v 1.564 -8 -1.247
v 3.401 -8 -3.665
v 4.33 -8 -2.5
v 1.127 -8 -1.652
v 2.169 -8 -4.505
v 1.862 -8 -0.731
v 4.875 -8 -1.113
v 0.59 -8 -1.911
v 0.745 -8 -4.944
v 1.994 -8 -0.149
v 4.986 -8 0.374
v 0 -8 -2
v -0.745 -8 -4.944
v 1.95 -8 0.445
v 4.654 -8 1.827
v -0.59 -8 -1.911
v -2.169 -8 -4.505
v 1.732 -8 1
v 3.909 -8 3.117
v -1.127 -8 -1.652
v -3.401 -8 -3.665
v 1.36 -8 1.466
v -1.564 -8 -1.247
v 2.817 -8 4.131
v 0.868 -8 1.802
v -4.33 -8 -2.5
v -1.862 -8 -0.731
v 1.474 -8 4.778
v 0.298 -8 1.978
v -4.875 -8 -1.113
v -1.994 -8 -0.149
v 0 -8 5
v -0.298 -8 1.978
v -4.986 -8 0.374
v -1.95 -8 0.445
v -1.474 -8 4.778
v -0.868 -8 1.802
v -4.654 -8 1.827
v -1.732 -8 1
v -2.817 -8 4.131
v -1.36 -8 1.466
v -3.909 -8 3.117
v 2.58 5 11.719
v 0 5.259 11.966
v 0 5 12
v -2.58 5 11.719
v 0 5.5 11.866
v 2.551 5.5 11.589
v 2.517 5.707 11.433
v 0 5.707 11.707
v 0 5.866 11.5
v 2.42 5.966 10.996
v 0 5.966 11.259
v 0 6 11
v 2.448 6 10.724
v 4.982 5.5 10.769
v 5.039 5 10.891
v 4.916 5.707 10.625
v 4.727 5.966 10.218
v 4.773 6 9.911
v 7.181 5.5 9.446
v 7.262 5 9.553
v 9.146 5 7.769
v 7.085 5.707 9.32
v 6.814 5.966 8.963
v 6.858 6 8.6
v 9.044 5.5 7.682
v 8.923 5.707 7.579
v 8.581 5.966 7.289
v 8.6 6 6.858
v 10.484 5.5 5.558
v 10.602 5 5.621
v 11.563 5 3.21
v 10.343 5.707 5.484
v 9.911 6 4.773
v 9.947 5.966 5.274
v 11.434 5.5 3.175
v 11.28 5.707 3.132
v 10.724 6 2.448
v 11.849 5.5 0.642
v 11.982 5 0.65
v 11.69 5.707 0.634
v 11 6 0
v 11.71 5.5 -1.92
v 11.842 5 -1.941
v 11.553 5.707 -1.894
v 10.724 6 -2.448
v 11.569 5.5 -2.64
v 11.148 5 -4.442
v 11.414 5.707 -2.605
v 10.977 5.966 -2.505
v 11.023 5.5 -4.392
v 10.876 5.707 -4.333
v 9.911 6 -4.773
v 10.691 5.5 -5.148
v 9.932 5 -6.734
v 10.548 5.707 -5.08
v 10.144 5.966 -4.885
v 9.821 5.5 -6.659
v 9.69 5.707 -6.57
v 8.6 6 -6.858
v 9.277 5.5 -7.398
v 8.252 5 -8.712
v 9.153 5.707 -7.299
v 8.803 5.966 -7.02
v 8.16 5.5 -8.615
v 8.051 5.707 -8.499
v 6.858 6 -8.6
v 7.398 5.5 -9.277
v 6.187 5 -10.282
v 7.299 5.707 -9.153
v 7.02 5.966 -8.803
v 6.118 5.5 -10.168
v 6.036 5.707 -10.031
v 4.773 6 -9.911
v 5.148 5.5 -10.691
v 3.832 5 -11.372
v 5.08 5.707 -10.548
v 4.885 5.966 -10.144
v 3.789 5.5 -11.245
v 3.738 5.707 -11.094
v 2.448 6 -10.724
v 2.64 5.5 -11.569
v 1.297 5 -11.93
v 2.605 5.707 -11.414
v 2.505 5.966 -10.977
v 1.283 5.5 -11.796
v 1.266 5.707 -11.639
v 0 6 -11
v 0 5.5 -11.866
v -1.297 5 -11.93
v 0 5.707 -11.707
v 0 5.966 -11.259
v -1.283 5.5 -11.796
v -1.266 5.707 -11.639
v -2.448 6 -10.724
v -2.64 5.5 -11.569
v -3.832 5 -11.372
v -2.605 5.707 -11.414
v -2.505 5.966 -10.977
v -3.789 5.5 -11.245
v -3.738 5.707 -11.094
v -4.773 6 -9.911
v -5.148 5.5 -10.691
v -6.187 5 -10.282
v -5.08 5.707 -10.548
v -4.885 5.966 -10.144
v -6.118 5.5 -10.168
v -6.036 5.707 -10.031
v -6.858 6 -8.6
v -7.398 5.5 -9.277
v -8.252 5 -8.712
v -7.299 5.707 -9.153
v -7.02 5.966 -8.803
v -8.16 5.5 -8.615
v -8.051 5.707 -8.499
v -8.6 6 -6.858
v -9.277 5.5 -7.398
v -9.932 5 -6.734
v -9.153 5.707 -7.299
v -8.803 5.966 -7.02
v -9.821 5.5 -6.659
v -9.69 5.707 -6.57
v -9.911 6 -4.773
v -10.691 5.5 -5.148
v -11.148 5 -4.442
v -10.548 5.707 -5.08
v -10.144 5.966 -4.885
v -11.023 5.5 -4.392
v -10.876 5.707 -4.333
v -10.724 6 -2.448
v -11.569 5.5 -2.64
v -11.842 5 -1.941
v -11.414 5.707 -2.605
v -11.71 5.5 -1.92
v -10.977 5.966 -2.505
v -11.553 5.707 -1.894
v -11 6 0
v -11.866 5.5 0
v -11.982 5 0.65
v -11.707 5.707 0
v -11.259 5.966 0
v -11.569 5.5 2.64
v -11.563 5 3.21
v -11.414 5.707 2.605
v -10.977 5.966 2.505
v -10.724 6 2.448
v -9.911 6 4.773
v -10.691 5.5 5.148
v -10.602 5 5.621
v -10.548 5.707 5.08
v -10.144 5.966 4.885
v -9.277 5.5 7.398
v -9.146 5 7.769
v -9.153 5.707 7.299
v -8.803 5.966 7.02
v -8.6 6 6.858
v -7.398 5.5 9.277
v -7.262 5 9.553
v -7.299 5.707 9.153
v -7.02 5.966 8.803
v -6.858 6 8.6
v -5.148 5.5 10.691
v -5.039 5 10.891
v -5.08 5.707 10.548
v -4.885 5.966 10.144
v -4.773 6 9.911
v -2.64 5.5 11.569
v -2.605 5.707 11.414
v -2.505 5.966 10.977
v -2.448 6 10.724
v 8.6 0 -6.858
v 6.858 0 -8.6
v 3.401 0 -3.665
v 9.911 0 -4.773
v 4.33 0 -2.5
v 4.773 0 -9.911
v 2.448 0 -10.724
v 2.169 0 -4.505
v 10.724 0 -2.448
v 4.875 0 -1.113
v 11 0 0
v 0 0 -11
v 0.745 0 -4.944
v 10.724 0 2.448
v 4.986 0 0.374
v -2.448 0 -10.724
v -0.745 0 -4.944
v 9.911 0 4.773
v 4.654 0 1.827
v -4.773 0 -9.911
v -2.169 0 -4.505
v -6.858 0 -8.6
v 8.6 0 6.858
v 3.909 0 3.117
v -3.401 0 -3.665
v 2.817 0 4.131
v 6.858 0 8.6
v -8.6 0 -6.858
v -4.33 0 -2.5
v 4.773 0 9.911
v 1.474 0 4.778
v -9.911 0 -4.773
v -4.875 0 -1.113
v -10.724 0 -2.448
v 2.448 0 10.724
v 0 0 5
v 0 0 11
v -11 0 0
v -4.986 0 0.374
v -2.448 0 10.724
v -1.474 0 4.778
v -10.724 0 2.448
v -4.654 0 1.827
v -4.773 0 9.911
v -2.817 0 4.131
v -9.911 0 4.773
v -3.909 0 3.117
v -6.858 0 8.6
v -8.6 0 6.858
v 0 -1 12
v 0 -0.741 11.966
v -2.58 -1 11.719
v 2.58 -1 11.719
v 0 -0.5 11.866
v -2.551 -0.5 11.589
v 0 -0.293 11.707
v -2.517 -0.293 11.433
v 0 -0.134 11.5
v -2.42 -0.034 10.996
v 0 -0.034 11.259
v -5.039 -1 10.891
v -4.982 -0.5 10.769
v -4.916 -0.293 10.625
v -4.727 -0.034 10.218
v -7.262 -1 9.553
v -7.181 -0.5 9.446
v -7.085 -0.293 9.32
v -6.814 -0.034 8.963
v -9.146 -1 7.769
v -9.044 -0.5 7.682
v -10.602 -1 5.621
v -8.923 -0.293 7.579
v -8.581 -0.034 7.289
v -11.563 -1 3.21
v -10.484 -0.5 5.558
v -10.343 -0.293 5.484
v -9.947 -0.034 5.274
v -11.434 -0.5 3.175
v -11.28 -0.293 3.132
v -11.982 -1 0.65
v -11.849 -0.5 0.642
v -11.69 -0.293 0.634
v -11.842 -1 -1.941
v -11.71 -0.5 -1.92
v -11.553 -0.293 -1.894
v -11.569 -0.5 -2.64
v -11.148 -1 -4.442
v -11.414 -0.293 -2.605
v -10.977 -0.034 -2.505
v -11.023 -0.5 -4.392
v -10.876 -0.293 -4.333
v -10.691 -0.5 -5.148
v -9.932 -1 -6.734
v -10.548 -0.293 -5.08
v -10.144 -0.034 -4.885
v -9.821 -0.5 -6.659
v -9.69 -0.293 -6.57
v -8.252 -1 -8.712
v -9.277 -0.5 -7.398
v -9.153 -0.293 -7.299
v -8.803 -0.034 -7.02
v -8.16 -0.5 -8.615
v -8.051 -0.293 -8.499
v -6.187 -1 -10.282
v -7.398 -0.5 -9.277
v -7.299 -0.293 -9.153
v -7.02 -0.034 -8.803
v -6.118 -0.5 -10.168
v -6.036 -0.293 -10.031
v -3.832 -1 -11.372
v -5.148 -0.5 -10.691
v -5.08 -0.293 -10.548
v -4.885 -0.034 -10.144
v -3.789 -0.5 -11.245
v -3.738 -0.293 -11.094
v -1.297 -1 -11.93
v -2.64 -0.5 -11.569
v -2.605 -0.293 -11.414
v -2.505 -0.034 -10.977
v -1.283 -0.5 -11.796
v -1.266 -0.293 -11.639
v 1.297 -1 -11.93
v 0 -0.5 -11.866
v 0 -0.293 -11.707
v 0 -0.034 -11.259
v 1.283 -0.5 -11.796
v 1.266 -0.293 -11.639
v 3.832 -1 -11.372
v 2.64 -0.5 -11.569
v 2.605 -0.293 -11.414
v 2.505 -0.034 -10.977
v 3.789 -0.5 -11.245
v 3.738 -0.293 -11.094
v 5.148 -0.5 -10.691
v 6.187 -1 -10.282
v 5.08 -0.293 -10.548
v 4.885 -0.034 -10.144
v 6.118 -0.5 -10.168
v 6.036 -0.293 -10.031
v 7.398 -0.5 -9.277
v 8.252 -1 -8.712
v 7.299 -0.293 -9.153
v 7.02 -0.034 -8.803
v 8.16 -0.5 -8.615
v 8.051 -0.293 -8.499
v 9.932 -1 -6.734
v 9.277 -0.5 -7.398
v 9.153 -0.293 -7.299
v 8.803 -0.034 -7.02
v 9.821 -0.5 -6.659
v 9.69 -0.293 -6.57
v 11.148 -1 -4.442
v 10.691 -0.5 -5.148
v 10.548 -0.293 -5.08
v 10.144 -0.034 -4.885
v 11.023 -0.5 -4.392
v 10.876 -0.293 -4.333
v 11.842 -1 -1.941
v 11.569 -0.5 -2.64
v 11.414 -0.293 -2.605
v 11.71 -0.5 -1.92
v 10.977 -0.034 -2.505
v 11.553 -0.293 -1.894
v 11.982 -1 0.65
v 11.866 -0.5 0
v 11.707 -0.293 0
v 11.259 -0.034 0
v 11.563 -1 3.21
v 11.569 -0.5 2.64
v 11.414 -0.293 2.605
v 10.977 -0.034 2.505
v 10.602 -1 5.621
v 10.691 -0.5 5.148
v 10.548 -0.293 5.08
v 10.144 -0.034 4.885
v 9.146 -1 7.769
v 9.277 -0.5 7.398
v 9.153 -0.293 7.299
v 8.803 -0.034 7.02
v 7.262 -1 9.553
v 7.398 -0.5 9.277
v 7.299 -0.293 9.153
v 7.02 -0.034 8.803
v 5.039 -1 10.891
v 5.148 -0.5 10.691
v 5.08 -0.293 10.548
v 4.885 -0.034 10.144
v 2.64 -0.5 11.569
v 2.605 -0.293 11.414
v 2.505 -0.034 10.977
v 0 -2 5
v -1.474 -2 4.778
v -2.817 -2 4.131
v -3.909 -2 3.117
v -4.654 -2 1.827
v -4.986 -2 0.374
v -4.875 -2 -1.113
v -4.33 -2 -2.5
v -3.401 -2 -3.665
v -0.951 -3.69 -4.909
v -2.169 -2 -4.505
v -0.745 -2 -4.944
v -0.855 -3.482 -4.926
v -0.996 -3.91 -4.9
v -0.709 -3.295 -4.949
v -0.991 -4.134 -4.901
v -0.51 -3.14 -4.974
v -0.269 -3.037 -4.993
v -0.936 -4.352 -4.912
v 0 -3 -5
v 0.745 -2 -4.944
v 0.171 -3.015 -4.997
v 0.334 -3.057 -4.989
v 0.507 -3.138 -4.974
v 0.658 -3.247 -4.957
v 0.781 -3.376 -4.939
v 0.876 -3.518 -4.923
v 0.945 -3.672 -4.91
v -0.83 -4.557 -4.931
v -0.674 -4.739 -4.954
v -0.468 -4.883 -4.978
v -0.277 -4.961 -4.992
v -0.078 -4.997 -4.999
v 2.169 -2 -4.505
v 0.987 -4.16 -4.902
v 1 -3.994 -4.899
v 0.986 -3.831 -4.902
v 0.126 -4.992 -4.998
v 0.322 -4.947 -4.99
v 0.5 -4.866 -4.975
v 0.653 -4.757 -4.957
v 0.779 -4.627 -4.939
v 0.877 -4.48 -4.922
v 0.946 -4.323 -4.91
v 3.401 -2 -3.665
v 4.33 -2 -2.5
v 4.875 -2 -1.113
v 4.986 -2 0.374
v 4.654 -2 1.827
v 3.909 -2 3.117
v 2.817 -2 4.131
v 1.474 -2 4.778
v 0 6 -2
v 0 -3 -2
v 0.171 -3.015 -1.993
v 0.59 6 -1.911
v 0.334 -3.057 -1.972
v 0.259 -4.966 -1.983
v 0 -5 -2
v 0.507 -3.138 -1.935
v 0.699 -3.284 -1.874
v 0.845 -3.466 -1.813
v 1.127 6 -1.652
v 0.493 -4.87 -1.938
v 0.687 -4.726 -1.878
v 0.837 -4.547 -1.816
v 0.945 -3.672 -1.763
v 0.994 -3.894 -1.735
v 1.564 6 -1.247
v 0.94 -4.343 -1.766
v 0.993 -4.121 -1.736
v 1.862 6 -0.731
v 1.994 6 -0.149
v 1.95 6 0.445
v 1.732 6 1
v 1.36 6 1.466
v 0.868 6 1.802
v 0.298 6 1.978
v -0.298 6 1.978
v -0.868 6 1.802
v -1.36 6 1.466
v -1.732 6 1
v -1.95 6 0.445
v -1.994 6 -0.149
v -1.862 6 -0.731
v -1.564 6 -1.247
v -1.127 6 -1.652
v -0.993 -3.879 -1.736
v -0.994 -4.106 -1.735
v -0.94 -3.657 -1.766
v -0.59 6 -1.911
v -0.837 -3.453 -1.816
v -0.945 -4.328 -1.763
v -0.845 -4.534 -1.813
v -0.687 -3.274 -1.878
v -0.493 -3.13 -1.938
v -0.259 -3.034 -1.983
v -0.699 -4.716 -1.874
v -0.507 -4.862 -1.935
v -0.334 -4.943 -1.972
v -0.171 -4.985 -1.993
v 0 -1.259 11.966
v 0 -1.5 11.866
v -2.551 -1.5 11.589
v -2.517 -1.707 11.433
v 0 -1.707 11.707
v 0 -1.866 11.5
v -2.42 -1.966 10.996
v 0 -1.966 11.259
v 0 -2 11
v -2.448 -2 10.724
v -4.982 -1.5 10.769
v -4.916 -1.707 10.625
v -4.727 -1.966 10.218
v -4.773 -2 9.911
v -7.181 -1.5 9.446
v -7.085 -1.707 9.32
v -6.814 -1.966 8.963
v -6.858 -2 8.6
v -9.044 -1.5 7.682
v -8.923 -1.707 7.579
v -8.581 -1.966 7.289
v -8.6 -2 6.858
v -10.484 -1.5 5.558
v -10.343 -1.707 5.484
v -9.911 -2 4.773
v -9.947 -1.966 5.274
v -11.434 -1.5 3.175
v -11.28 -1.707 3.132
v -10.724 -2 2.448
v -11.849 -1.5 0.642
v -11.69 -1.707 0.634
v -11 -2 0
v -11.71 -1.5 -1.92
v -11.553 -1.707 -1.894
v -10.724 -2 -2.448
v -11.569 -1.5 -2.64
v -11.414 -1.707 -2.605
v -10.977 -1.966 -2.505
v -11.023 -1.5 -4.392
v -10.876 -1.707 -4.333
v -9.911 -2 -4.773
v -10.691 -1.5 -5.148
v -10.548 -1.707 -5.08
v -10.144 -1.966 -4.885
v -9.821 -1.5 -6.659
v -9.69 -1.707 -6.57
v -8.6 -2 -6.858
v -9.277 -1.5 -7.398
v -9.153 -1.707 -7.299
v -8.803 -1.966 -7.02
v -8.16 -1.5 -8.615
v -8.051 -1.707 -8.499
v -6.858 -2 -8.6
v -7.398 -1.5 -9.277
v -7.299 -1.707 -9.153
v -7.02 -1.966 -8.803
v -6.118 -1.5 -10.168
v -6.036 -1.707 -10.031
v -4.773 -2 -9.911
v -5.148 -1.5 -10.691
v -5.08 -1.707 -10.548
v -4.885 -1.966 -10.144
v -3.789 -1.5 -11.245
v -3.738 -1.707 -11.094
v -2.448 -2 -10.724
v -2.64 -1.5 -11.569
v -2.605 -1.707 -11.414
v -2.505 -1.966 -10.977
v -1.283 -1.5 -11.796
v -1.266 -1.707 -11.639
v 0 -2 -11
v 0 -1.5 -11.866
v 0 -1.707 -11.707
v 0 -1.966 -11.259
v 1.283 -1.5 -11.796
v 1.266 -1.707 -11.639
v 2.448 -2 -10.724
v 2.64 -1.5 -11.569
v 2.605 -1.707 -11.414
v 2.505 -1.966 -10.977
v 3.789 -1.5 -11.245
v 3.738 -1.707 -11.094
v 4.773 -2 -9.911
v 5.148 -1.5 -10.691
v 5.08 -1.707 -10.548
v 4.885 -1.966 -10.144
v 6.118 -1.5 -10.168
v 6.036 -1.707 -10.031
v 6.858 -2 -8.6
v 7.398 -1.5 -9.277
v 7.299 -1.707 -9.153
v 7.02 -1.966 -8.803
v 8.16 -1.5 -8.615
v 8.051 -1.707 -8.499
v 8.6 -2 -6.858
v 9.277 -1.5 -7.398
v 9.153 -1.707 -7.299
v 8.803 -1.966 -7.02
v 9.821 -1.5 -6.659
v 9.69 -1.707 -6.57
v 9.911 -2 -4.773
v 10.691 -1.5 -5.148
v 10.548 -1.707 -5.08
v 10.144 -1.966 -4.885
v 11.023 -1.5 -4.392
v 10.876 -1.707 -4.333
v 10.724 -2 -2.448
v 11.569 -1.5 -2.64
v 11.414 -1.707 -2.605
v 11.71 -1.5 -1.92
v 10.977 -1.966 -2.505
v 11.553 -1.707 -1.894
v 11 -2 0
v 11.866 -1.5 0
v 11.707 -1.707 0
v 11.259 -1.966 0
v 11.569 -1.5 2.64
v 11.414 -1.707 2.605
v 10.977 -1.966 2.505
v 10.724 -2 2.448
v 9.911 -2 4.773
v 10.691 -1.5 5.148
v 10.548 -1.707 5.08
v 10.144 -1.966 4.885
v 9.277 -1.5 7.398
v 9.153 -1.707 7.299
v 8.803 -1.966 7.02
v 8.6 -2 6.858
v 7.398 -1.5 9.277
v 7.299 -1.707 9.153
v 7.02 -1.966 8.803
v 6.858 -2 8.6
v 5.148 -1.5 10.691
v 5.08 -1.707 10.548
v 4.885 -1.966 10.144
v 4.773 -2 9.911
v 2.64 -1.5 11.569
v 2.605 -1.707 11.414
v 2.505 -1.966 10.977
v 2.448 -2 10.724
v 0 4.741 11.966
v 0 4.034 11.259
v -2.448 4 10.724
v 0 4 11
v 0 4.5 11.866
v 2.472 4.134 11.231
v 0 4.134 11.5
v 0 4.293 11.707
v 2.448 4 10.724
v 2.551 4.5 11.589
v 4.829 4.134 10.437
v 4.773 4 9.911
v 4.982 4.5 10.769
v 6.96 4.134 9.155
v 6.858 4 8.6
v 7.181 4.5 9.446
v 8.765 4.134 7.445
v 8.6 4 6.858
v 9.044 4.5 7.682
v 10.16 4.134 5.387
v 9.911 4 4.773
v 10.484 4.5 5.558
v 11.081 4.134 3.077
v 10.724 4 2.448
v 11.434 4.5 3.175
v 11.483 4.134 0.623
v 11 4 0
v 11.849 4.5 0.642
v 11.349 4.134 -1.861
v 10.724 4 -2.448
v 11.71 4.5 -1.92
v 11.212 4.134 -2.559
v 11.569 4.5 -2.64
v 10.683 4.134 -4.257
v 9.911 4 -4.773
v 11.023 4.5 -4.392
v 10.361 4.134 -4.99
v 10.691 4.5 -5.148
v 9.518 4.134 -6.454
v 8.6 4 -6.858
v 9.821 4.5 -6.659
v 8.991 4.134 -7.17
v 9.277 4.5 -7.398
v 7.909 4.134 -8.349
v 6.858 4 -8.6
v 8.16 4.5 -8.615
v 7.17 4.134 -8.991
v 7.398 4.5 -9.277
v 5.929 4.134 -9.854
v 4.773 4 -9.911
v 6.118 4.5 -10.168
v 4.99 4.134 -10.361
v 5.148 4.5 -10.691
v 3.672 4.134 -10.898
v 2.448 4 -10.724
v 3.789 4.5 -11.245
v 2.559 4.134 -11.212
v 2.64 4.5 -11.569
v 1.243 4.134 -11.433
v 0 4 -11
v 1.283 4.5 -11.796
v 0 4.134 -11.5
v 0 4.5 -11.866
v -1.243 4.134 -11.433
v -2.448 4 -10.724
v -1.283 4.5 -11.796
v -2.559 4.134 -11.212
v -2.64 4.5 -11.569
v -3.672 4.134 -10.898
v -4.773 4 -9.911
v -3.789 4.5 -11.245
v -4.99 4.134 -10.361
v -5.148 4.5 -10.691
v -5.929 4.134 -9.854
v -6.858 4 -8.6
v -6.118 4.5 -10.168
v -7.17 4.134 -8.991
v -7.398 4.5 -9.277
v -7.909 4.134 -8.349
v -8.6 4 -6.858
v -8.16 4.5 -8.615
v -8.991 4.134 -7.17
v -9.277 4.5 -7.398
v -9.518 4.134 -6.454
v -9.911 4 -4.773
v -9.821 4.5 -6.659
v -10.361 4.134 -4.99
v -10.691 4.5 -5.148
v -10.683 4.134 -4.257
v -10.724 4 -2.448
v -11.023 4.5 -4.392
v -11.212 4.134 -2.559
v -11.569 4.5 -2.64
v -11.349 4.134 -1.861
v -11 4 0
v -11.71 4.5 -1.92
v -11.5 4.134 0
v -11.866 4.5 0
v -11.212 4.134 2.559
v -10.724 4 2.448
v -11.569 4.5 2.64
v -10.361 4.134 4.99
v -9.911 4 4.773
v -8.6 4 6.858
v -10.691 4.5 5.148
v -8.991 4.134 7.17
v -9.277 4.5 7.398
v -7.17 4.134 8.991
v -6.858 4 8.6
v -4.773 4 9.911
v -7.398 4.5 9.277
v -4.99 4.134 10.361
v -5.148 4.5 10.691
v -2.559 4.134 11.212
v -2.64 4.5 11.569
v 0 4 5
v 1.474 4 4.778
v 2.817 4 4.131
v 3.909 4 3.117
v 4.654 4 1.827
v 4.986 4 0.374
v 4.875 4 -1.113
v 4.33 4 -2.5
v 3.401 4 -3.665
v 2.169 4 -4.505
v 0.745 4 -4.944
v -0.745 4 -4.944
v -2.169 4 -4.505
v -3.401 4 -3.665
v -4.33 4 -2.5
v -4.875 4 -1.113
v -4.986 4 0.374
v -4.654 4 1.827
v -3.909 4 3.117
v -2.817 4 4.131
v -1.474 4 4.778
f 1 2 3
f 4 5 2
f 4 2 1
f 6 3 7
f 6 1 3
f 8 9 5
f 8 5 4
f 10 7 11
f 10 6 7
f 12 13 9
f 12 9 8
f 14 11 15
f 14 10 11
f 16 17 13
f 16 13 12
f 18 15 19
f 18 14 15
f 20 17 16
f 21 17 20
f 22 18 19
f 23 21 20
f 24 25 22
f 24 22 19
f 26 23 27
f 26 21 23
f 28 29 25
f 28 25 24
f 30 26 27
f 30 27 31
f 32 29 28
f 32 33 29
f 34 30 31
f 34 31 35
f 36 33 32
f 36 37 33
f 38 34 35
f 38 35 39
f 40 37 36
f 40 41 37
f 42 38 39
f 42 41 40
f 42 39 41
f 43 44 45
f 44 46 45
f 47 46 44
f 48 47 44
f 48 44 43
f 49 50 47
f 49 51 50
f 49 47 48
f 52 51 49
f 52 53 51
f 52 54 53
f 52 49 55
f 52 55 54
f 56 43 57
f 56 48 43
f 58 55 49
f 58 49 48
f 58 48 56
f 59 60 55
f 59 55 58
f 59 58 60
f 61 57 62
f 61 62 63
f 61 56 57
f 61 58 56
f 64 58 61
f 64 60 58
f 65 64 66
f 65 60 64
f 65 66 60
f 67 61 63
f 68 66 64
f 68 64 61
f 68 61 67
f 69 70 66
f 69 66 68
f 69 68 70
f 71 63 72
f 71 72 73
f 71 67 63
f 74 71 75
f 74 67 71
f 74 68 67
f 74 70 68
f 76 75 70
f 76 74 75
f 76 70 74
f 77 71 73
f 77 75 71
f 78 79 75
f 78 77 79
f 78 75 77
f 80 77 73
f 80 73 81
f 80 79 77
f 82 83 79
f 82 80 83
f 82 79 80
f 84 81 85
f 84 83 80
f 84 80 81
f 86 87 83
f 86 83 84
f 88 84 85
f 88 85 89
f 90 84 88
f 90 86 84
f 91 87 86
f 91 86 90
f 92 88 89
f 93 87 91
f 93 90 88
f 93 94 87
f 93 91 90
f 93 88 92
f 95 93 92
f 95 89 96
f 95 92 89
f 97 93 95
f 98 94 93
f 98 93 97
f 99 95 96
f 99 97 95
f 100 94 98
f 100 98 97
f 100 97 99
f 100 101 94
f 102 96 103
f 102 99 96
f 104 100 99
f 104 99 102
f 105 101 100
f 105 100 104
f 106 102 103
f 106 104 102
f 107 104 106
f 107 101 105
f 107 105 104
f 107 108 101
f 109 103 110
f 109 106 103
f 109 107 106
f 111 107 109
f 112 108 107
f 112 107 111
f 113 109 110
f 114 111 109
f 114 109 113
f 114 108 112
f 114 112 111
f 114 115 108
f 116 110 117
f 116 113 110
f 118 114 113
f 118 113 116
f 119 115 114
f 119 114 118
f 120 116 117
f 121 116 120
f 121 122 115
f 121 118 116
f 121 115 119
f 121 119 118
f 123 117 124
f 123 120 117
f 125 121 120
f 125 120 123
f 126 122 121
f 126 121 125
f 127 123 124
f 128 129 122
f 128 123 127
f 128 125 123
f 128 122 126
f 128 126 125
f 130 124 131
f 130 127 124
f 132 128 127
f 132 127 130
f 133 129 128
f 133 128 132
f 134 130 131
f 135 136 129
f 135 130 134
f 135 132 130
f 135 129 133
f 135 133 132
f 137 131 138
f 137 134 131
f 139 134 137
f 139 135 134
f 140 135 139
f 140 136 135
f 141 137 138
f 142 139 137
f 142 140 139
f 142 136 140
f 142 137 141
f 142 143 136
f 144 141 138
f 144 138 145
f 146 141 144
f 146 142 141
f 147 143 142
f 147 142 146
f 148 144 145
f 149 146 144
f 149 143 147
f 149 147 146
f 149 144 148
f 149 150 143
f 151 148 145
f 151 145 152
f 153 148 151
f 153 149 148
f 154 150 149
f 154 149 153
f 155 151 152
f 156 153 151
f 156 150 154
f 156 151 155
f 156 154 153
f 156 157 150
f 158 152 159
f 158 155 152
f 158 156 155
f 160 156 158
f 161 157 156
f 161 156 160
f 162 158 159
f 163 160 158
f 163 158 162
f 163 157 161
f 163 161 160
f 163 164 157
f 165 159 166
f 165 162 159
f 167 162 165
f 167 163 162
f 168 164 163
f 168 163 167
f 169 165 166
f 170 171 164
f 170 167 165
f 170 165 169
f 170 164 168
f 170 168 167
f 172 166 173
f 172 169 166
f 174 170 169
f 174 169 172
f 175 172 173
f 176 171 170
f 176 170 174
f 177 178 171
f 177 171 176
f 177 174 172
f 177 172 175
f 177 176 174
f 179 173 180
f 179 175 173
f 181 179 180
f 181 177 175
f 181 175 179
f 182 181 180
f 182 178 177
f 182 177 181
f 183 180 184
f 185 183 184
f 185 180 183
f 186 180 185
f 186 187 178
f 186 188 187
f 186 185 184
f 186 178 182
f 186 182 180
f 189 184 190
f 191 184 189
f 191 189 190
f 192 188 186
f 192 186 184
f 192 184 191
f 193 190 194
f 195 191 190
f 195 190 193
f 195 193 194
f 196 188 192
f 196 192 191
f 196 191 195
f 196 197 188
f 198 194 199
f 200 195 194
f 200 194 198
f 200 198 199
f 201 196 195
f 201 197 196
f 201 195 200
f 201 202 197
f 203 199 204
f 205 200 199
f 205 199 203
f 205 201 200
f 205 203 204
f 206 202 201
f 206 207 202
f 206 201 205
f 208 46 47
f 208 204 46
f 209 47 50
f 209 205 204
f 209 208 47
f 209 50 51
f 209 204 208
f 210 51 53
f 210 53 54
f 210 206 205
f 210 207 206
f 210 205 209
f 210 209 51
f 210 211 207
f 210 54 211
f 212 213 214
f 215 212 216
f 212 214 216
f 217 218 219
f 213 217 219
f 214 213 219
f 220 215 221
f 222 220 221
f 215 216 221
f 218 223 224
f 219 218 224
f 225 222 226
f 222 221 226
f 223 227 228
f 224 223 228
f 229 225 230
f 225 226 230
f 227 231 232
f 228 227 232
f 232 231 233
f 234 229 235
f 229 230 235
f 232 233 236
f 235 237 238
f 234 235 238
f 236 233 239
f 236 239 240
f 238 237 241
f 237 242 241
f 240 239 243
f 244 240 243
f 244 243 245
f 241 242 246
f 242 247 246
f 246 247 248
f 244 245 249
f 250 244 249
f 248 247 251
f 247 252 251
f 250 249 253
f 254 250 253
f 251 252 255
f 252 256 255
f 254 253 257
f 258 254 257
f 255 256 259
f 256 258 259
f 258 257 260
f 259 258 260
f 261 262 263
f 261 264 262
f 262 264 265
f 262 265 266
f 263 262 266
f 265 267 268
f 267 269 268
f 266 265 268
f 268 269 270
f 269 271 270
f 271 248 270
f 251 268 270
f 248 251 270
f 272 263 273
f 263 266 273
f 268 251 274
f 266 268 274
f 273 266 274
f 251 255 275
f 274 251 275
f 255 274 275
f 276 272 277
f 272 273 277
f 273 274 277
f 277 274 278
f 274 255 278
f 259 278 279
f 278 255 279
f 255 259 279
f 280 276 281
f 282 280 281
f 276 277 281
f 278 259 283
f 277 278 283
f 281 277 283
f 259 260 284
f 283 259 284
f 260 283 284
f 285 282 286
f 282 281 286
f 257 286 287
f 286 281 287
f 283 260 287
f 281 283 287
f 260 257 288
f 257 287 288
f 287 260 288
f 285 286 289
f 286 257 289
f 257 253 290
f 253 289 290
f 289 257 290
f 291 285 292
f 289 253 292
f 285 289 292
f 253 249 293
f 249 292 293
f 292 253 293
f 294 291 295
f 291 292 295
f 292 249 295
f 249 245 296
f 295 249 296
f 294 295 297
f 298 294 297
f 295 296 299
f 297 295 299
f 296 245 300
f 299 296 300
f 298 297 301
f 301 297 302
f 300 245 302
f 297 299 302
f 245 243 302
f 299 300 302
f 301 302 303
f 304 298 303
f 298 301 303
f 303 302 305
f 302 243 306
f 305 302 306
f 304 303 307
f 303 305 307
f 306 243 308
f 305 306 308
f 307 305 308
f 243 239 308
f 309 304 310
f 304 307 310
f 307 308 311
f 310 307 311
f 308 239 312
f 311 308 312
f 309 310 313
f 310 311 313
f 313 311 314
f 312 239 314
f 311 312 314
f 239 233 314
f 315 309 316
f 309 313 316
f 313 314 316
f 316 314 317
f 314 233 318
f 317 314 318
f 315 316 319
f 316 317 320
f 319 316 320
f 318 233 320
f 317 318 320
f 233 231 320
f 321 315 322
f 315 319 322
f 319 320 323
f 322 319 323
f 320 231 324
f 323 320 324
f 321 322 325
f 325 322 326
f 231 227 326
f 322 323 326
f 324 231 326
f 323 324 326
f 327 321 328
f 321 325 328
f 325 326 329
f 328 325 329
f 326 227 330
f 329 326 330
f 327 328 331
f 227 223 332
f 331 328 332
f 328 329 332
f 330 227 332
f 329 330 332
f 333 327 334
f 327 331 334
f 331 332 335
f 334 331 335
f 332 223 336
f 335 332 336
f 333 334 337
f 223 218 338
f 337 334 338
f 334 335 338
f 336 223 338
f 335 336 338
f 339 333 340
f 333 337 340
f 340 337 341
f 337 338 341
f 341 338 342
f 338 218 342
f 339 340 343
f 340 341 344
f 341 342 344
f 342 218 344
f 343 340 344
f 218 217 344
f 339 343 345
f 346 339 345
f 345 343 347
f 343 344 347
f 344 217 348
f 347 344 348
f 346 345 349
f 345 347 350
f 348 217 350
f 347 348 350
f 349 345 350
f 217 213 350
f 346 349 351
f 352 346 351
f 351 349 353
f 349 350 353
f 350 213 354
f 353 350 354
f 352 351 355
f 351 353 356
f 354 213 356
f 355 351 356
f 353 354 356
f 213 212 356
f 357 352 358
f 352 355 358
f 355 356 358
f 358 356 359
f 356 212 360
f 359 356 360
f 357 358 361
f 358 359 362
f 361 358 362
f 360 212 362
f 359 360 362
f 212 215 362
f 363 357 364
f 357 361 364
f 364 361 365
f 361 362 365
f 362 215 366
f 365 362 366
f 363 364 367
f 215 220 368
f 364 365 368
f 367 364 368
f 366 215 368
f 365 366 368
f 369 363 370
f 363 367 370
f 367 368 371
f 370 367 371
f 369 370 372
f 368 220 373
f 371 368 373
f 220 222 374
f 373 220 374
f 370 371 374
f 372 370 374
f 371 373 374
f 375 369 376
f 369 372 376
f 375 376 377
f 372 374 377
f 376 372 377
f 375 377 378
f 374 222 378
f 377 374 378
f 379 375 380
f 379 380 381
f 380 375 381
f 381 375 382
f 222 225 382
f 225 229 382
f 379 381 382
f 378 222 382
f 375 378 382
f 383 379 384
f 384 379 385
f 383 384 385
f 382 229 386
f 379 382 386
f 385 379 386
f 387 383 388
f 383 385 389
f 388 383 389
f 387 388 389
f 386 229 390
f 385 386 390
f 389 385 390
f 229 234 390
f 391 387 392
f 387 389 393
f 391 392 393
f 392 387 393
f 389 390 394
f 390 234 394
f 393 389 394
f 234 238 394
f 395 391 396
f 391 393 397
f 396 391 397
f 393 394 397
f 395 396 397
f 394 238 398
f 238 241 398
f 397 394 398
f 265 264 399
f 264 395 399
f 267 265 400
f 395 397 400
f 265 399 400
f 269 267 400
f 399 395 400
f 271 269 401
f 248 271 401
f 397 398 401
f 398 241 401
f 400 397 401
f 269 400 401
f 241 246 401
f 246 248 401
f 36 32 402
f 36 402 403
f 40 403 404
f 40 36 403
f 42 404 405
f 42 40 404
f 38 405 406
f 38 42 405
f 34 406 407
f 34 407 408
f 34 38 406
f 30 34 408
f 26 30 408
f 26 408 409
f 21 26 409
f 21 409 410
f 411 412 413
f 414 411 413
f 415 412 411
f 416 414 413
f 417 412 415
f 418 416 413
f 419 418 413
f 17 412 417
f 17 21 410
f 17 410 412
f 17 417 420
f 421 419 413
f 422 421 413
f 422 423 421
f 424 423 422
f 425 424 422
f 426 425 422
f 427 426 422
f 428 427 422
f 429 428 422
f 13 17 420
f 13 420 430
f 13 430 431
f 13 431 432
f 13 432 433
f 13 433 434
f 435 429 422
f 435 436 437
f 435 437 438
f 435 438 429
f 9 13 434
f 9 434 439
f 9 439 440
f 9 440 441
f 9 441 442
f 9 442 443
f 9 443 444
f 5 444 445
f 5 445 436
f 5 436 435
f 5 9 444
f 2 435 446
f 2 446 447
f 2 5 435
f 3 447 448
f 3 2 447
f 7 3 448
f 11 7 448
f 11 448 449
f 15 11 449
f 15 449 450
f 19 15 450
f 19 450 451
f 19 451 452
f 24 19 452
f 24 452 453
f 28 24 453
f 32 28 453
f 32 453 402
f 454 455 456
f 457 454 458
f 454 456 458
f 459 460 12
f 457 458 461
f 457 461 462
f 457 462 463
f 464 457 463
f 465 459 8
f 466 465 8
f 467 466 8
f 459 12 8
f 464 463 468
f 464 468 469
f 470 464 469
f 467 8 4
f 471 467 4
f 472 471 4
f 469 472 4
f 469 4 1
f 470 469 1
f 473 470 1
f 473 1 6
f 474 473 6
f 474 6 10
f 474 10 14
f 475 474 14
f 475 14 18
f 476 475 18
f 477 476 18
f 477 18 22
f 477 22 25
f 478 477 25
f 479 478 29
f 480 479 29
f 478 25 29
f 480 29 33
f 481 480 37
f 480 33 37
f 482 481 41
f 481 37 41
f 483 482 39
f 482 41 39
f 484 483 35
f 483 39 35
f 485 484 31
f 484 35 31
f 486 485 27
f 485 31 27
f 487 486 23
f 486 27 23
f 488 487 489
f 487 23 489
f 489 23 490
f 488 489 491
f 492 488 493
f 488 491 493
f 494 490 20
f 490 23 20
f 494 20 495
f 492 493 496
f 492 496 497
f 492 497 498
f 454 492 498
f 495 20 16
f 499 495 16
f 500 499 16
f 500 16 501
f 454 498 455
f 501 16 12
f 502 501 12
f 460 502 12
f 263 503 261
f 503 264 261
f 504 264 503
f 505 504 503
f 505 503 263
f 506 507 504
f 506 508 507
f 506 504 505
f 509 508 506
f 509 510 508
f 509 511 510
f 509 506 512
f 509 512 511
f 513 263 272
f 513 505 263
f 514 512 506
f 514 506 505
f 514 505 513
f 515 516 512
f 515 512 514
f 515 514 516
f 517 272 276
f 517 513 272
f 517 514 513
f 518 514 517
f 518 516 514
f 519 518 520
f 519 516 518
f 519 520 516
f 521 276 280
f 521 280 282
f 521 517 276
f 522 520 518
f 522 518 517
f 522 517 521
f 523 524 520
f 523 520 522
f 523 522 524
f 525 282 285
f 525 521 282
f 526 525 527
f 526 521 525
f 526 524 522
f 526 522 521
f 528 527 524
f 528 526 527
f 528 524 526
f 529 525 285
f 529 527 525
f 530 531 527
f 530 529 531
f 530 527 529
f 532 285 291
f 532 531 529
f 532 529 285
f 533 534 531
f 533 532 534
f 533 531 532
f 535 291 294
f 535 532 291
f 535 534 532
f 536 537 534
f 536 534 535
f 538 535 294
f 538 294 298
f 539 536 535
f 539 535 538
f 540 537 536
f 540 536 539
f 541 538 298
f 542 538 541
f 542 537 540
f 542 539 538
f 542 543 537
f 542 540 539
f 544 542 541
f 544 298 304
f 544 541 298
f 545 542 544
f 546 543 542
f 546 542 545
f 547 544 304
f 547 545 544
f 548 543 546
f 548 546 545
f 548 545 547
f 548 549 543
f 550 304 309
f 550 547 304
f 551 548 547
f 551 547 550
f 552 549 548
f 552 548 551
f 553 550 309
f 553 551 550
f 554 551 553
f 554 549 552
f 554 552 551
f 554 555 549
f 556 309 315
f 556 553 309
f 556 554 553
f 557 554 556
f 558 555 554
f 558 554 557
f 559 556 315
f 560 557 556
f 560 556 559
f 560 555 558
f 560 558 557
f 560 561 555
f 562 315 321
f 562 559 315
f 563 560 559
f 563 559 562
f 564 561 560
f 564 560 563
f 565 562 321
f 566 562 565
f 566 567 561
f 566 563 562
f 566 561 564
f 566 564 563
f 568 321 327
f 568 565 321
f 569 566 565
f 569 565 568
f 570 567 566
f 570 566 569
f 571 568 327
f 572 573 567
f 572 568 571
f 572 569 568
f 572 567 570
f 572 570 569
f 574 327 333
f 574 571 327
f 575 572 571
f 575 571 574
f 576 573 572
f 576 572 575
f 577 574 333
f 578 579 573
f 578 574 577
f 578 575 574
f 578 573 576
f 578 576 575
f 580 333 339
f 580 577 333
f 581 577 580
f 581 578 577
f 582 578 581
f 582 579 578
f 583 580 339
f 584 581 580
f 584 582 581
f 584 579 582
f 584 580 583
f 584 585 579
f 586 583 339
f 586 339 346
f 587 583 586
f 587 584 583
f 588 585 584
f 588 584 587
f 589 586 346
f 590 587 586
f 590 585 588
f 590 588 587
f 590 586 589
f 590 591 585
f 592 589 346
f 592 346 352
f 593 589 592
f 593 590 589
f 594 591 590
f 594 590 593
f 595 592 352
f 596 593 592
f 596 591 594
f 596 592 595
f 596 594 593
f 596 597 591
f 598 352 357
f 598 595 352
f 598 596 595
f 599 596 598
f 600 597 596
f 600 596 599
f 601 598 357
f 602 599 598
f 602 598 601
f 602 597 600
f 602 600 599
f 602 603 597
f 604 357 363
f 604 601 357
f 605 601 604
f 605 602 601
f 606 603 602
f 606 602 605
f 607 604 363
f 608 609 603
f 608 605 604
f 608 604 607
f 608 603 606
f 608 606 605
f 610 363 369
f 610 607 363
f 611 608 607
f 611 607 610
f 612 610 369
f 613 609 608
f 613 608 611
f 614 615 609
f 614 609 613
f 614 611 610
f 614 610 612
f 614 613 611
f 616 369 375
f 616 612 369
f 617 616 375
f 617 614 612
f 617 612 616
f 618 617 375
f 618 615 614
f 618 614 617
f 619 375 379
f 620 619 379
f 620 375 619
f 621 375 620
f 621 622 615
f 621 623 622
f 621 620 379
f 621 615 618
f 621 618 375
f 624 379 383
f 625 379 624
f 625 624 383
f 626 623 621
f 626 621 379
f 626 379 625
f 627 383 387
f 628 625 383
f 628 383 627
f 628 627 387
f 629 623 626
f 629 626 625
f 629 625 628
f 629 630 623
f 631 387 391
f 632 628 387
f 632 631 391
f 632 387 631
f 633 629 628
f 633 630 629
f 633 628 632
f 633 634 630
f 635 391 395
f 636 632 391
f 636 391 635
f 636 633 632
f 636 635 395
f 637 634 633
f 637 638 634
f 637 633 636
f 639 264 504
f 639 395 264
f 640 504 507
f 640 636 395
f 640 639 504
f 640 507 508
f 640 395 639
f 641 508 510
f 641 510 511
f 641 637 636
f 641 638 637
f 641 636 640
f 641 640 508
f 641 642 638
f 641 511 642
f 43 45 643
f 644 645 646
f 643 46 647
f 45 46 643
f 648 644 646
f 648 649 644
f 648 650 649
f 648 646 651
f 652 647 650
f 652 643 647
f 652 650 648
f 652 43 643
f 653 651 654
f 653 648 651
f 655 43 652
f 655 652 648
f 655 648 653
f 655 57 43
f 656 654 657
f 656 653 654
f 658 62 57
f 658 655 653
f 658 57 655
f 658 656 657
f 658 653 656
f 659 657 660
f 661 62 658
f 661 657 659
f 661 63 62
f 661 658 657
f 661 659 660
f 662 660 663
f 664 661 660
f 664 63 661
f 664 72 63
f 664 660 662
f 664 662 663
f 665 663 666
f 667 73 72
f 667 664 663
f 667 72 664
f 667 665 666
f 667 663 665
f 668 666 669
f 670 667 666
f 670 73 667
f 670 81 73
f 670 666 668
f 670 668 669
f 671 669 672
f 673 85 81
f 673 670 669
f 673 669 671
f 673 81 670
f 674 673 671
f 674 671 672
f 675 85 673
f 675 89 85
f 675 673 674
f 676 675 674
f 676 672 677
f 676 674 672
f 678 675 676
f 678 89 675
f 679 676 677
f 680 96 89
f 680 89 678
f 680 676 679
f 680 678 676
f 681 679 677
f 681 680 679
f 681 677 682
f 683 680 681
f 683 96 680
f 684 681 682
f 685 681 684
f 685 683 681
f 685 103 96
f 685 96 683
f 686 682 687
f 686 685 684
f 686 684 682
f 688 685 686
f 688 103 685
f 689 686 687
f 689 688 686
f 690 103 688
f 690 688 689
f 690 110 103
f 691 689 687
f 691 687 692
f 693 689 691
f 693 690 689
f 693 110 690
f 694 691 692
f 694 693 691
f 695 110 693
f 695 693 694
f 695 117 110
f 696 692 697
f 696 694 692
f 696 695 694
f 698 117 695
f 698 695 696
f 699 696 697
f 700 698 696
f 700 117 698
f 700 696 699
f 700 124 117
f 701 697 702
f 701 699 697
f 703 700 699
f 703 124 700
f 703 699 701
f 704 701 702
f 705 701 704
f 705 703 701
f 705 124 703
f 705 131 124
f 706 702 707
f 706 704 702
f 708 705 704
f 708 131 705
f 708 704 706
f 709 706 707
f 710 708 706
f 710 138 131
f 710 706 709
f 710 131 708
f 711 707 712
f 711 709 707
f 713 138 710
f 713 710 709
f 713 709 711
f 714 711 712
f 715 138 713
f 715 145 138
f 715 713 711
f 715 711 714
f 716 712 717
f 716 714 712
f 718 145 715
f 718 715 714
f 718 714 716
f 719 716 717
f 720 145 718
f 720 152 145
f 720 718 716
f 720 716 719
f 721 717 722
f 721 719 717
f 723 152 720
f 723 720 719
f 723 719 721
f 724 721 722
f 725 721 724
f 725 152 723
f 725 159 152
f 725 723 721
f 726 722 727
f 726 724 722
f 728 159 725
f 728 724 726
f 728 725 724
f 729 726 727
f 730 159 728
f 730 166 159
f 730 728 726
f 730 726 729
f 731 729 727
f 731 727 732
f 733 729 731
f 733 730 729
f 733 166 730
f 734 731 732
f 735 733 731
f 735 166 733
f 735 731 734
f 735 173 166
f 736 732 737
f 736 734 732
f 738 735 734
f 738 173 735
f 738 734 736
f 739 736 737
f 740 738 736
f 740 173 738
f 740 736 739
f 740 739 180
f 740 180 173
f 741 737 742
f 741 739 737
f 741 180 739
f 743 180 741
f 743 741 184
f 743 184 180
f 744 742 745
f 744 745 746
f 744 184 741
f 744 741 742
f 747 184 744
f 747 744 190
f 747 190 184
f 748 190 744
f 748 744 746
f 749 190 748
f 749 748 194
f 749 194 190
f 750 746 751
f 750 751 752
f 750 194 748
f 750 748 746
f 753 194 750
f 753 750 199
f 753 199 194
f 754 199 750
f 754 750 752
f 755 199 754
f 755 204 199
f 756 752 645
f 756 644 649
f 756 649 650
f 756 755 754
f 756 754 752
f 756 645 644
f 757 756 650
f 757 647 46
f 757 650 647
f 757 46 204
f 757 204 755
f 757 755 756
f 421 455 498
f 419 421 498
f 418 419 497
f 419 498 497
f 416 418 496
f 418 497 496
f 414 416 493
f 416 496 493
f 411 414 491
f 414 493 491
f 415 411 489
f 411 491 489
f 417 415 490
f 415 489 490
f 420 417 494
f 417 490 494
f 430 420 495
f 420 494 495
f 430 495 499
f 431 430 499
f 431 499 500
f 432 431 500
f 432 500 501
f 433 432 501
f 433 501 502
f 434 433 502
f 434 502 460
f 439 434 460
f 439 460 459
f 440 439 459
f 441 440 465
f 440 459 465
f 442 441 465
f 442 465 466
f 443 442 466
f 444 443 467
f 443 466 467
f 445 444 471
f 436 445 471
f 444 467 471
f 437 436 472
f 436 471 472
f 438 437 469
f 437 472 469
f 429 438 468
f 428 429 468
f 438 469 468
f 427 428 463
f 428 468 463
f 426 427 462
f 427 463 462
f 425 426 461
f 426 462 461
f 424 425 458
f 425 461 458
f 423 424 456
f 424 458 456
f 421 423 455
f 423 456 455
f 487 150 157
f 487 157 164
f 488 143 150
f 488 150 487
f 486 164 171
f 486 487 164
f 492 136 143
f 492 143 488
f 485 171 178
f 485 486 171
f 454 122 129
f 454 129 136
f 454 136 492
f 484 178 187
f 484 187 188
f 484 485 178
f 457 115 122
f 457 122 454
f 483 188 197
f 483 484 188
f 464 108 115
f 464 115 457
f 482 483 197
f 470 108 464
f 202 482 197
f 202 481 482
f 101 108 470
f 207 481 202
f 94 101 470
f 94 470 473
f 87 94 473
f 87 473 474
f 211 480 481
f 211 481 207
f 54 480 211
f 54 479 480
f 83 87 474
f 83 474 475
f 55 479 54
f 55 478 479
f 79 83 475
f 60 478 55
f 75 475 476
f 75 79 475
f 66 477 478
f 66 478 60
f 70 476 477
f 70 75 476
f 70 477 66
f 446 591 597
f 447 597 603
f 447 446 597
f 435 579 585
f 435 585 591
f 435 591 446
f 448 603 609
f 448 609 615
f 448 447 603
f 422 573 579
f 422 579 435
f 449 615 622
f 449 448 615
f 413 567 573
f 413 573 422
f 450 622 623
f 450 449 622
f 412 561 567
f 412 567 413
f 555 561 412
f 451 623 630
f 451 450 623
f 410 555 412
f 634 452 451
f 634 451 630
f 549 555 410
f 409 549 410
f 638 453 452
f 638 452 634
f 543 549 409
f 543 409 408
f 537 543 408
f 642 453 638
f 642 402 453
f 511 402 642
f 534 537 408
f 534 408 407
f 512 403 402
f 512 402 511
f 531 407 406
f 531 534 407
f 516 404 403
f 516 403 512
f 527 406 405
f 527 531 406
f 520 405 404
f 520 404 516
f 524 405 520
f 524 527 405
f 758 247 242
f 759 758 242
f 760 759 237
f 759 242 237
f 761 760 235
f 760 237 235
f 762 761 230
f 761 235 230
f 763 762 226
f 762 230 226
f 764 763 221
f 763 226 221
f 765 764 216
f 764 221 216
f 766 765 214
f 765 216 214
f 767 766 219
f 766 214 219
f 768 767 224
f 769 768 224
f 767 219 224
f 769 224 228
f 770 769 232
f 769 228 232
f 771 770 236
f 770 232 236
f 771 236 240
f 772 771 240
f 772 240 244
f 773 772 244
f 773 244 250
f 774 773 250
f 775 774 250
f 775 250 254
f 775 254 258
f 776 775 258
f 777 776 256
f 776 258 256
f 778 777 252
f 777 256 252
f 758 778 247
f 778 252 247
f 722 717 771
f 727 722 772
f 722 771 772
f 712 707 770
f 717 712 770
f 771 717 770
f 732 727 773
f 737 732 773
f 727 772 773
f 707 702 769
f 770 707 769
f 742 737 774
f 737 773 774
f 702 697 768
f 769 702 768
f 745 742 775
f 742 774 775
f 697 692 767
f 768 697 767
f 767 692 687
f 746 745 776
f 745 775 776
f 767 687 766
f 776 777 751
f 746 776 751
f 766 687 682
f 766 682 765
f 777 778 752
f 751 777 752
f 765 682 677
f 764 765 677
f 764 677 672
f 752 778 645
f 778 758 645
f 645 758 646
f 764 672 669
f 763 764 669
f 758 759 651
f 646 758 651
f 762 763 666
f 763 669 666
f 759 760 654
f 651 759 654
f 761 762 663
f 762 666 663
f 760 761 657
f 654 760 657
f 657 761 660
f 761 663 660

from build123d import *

# Parameters (mm, degrees)
SKETCH_1_R          = 5
EXTRUDE_1_DEPTH     = 4
SKETCH_2_R          = 12
EXTRUDE_2_DEPTH     = 2
EXTRUDE_START       = 2
SKETCH_3_R          = 12
EXTRUDE_3_DEPTH     = 2
EXTRUDE_START_2     = 6
SKETCH_4_R          = 5
EXTRUDE_4_DEPTH     = 6
SKETCH_5_R          = 2
CUT_EXTRUDE_1_DEPTH = 23
FILLET_2_R          = 1
SKETCH_6_R          = 1
CUT_EXTRUDE_2_DEPTH = 19.761663039


with BuildPart() as part:
    # 草图1 → 凸台-拉伸1 (new body)
    with BuildSketch(Plane(origin=(0, 0, 0), x_dir=(1, 0, 0), z_dir=(0, 1, 0))):
        with Locations(Location((0, 0, 0), (0, 0, 270))):
            Circle(SKETCH_1_R)
    extrude(amount=EXTRUDE_1_DEPTH)

    # 草图2 → 凸台-拉伸2 (add)
    with BuildSketch(Plane(origin=(0, 4, 0), x_dir=(1, 0, 0), z_dir=(0, 1, 0))):
        with Locations(Location((0, 0, 0), (0, 0, 270))):
            Circle(SKETCH_2_R)
    extrude(amount=EXTRUDE_2_DEPTH)

    # 草图3 → 凸台-拉伸3 (add)
    with BuildSketch(Plane.XZ.offset(EXTRUDE_START)):
        with Locations(Location((0, 0, 0), (0, 0, 90))):
            Circle(SKETCH_3_R)
    extrude(amount=-EXTRUDE_3_DEPTH)

    # 草图4 → 凸台-拉伸4 (add)
    with BuildSketch(Plane(origin=(0, -2, 0), x_dir=(-1, 0, 0), z_dir=(0, -1, 0)).offset(EXTRUDE_START_2)):
        with Locations(Location((0, 0, 0), (0, 0, 270))):
            Circle(SKETCH_4_R)
    extrude(amount=-EXTRUDE_4_DEPTH)

    # 草图5 → 切除-拉伸1 (cut, through all)
    with BuildSketch(Plane.XZ.offset(8)):
        with Locations(Location((0, 0, 0), (0, 0, 270))):
            Circle(SKETCH_5_R)
    extrude(amount=-CUT_EXTRUDE_1_DEPTH, mode=Mode.SUBTRACT)

    # 圆角2
    fillet_2_edges = [part.edges().sort_by_distance(p)[0] for p in [
        (0, -2, -12),
        (0, 4, -12),
        (0, 6, -12),
        (0, 0, -12),
    ]]
    fillet(fillet_2_edges, radius=FILLET_2_R - 0.0001)  # a hair under: the kernel refuses the full size

    # 草图6 → 切除-拉伸2 (cut, through all)
    with BuildSketch(Plane.XY):
        with Locations(Location((0, -4, 0), (0, 0, 90))):
            Circle(SKETCH_6_R)
    extrude(amount=-CUT_EXTRUDE_2_DEPTH, mode=Mode.SUBTRACT)


solid = part.part
